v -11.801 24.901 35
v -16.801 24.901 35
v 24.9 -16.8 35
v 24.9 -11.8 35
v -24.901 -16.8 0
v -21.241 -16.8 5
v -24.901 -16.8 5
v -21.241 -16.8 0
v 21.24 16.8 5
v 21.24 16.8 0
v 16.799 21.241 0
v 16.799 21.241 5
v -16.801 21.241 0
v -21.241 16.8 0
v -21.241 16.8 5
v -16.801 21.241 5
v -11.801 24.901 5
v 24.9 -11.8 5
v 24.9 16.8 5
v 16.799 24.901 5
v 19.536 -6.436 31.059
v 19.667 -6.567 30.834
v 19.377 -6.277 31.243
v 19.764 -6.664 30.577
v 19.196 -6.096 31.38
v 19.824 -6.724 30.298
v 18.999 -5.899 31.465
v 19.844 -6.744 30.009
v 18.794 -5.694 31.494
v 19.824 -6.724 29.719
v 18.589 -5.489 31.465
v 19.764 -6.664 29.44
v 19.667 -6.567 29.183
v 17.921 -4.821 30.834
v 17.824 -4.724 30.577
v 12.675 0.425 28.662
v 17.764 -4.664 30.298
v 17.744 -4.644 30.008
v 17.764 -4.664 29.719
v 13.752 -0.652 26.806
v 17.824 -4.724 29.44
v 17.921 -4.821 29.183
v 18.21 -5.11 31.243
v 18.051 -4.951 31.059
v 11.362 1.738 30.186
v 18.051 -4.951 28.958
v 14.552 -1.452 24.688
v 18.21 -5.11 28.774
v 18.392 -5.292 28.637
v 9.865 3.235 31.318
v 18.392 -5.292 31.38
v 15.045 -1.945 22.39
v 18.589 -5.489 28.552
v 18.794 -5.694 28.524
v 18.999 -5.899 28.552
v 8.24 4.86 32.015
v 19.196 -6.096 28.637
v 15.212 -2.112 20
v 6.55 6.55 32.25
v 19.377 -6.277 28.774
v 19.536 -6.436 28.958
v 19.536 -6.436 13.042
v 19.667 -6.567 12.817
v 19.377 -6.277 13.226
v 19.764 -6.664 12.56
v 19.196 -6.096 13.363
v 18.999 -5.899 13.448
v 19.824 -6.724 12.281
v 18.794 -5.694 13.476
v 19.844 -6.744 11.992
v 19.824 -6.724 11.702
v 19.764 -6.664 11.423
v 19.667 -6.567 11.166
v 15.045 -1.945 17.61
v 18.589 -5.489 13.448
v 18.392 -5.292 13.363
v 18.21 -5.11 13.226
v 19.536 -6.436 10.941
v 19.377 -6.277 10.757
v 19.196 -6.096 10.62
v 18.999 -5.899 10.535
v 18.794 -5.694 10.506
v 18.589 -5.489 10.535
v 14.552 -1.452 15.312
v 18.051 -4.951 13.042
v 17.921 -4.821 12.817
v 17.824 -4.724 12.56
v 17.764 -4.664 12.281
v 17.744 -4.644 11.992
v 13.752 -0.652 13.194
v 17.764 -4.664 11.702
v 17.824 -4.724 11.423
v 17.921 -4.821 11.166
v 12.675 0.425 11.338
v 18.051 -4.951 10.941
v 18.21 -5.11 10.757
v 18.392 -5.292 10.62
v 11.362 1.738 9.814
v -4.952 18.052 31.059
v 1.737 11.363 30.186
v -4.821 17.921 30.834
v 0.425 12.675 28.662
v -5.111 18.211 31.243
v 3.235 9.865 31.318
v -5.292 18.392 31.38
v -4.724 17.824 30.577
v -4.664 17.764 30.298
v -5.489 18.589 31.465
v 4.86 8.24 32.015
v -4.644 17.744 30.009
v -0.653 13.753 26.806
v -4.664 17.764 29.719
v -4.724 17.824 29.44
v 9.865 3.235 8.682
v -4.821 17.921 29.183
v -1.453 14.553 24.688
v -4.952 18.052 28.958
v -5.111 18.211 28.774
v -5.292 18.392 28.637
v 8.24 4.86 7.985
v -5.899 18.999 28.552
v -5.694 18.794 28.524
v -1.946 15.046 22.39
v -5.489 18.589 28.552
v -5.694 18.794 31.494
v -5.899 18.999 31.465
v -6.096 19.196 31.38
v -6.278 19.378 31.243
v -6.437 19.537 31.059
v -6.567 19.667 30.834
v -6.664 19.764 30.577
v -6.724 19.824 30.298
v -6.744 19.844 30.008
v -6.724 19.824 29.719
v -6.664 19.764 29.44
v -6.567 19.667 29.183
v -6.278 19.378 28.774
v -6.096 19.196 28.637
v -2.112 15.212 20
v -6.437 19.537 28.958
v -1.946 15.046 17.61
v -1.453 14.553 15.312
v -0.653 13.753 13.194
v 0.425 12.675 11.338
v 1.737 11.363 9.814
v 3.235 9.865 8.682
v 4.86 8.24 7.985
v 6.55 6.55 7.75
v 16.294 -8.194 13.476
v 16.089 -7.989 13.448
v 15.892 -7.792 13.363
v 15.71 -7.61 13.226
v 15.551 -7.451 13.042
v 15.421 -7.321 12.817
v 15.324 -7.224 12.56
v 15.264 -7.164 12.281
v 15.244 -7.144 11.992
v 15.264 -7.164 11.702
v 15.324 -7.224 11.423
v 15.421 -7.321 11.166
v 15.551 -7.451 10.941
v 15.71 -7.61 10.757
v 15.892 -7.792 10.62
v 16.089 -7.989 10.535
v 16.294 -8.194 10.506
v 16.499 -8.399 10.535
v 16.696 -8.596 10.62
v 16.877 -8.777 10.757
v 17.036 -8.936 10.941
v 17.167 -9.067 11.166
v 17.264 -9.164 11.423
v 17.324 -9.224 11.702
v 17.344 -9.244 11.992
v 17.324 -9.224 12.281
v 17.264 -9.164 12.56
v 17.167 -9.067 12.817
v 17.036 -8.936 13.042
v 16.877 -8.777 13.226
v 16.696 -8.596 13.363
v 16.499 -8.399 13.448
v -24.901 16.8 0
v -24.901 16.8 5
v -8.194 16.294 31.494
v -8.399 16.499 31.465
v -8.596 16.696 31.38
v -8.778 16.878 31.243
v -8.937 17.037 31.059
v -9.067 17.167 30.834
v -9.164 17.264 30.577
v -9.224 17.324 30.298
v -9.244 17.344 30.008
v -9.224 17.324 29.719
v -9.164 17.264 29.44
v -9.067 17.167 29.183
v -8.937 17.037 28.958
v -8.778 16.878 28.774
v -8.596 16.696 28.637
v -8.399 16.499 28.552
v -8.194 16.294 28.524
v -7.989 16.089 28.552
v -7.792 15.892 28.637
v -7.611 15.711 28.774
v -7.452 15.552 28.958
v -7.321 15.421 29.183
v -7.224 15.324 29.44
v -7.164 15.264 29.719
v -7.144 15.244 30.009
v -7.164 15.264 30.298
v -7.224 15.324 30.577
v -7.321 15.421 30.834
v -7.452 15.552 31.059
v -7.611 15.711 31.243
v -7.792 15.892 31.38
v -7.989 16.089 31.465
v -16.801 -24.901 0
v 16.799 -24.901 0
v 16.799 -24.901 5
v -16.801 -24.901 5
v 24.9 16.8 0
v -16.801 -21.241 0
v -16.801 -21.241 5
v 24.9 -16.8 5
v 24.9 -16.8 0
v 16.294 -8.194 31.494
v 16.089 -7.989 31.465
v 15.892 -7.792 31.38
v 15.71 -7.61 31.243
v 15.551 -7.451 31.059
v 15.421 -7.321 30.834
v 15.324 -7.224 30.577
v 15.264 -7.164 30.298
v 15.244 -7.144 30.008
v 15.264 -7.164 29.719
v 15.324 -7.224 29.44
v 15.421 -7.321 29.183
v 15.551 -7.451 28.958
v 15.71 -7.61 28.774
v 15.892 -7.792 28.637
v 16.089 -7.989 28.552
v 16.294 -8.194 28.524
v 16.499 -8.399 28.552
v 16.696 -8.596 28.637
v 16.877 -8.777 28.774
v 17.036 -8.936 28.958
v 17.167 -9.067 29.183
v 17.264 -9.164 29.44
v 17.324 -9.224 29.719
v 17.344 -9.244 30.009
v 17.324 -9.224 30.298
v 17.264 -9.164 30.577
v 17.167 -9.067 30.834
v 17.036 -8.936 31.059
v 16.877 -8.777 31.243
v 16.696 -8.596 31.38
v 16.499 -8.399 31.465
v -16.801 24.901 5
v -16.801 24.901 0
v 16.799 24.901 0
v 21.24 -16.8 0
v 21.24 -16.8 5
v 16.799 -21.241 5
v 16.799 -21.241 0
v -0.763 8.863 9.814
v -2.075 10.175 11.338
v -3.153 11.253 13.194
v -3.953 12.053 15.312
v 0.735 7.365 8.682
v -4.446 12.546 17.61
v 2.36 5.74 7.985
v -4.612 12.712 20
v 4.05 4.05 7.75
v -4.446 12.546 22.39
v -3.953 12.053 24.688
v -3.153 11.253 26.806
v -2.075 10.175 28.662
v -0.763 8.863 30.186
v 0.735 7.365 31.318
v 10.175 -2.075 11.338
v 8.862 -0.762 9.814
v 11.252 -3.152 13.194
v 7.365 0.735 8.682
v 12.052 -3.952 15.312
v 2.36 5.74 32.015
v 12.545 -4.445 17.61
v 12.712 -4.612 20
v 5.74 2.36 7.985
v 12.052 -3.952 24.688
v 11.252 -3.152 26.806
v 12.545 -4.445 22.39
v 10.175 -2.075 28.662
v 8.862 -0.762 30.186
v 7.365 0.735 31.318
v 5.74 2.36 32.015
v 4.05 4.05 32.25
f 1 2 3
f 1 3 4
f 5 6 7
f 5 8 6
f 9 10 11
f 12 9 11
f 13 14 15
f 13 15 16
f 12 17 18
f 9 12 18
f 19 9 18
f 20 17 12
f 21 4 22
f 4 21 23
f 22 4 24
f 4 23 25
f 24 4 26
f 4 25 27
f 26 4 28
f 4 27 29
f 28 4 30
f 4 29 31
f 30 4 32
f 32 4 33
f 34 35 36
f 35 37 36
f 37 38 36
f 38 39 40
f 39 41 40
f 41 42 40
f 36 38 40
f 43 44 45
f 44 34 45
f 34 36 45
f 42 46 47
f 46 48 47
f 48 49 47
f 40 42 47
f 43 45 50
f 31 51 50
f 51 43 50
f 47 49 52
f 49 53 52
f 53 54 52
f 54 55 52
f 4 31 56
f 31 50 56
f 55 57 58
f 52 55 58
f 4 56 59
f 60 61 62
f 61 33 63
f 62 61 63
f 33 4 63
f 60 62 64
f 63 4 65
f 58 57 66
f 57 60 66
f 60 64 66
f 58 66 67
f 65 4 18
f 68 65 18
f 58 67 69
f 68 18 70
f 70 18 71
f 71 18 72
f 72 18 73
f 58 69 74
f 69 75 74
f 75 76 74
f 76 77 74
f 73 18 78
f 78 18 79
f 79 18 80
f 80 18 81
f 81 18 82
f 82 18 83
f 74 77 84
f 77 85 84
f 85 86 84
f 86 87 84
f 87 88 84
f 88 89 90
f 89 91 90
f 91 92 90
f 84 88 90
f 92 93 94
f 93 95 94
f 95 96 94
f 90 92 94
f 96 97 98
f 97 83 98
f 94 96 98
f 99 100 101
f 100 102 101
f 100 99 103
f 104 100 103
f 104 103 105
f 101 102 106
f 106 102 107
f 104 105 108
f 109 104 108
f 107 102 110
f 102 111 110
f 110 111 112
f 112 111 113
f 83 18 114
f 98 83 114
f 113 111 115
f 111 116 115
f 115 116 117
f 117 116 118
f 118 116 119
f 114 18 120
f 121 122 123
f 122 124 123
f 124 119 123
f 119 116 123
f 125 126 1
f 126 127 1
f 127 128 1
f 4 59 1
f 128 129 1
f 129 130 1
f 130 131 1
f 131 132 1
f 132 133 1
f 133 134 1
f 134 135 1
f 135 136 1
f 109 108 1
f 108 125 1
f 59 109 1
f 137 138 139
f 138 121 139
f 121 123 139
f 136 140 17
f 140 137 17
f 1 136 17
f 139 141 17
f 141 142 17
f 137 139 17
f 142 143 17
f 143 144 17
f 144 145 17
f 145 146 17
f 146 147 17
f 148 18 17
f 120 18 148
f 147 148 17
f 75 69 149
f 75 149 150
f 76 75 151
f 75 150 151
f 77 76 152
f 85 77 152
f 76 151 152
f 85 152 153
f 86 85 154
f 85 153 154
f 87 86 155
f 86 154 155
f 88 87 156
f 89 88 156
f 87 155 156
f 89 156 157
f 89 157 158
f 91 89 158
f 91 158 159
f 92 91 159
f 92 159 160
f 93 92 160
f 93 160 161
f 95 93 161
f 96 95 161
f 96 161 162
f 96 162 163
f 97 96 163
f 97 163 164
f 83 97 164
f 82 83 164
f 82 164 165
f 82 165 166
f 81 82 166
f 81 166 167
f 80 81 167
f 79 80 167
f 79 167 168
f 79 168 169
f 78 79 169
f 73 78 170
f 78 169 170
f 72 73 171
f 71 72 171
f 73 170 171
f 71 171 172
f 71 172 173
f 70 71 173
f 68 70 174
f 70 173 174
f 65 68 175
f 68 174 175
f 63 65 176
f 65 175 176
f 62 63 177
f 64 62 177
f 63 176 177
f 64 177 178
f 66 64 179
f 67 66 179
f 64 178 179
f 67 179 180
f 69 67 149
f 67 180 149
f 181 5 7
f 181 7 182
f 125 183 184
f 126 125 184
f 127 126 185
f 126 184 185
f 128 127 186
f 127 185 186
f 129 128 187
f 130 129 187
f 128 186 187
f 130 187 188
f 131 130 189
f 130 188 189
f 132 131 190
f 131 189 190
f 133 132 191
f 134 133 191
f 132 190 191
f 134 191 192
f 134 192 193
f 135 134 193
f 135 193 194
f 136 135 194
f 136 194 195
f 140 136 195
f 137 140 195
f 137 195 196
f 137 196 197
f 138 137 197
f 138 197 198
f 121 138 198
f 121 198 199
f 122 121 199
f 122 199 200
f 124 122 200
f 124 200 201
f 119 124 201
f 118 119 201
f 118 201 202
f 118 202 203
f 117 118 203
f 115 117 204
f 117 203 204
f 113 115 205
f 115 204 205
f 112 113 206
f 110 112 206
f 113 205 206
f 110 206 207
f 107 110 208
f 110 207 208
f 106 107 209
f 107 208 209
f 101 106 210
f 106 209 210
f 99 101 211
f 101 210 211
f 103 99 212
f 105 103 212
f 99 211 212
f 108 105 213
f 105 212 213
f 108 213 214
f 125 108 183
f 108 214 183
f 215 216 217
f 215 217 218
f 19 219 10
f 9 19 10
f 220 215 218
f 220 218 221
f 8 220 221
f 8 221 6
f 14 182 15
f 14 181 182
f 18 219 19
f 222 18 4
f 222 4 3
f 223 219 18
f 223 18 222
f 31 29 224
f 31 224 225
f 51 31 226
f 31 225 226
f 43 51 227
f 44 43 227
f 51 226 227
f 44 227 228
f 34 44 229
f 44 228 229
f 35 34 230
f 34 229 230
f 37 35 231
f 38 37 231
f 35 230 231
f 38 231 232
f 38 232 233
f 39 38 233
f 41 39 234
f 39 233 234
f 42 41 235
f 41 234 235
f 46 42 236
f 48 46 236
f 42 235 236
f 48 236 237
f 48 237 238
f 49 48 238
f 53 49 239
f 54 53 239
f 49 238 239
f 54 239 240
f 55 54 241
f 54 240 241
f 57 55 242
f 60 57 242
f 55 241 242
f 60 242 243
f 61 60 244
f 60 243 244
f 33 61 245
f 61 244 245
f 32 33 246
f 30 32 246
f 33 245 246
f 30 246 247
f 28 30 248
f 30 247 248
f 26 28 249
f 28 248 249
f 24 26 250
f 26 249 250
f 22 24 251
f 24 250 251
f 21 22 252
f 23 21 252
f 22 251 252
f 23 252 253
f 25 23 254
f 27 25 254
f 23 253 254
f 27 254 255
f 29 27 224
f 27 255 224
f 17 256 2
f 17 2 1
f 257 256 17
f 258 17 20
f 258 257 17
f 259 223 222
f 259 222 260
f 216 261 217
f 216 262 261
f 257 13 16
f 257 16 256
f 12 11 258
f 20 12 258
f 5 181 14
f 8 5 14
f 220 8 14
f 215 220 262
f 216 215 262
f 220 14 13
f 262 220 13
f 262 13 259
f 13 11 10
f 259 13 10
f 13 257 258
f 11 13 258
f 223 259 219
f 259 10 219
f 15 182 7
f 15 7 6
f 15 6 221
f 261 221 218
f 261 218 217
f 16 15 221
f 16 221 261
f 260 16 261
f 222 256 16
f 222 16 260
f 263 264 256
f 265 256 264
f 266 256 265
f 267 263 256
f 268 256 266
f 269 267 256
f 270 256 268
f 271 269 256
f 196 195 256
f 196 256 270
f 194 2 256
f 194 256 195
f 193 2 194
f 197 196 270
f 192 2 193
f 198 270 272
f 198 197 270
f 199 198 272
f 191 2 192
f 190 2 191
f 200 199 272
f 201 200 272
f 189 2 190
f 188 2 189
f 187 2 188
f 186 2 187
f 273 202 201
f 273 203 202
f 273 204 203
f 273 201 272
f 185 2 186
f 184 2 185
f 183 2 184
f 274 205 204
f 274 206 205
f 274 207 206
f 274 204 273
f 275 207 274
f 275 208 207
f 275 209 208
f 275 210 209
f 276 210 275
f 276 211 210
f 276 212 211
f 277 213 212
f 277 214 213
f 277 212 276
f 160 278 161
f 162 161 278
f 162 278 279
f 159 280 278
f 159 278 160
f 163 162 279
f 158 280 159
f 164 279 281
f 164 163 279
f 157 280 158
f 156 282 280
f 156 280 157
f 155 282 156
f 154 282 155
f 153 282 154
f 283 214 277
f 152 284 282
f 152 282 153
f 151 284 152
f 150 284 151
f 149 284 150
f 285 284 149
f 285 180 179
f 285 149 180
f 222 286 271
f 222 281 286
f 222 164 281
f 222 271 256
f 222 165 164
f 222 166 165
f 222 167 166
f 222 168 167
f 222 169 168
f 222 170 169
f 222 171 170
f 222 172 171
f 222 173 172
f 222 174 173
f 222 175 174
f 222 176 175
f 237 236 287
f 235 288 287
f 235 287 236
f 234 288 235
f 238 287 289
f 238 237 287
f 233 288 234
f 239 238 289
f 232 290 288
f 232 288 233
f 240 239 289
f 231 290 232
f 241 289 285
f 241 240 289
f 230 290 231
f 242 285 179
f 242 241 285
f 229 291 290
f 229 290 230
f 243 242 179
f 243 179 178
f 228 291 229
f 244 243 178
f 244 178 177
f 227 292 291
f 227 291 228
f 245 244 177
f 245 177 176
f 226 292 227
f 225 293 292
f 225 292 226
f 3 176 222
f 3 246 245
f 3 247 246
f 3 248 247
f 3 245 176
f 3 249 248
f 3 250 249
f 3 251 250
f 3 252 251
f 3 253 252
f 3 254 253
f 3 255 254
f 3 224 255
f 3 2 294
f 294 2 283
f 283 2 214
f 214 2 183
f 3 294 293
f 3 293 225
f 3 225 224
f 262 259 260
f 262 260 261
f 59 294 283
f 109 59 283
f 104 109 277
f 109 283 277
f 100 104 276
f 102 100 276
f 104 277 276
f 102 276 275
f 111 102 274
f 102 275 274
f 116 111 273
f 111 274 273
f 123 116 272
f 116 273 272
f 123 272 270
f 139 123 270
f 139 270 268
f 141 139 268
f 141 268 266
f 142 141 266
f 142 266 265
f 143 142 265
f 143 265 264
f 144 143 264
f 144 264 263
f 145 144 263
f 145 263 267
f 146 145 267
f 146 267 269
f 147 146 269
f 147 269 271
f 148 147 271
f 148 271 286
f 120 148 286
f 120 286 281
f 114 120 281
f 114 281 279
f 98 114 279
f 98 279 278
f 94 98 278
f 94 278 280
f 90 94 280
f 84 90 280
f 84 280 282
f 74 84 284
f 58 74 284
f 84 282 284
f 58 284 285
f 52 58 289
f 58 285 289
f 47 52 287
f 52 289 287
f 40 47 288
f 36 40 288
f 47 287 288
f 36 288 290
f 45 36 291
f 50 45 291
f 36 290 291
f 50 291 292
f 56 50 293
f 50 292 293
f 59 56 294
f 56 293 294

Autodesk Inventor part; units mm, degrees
ref_plane "YZ Plane" through (0, 0, 0) normal (1, 0, 0) x (0, 1, 0)
ref_plane "XZ Plane" through (0, 0, 0) normal (0, 1, 0) x (-1, 0, 0)
ref_plane "XY Plane" through (0, 0, 0) normal (0, 0, 1) x (1, 0, 0)
sketch "草图1" plane through (0, 0, 0) normal (0, 0, 1) x (1, 0, 0)
  line L0 (24.9, 0) -> (24.9, 16.8)
  line L1 (24.9, 0) -> (41.7, 0) construction
  line L2 (24.9, 16.8) -> (21.24, 16.8)
  line L3 (21.24, 16.8) -> (16.7994, 21.2406)
  line L4 (16.7994, 21.2406) -> (16.7994, 24.9006)
  line L5 (16.7994, 24.9006) -> (-0.0006, 24.9006)
  line L6 (24.9, 0) -> (24.9, -16.8)
  line L7 (24.9, -16.8) -> (21.24, -16.8)
  line L8 (21.24, -16.8) -> (16.7994, -21.2406)
  line L9 (16.7994, -21.2406) -> (16.7994, -24.9006)
  line L10 (16.7994, -24.9006) -> (-0.0006, -24.9006)
  line L11 (-0.0006, -24.9006) -> (-16.8006, -24.9006)
  line L12 (-16.8006, -24.9006) -> (-16.8006, -21.2406)
  line L13 (-16.8006, -21.2406) -> (-21.2413, -16.8)
  line L14 (-21.2413, -16.8) -> (-24.9013, -16.8)
  line L15 (-24.9013, -16.8) -> (-24.9013, 0)
  line L16 (-24.9013, 0) -> (-24.9013, 16.8)
  line L17 (-24.9013, 16.8) -> (-21.2413, 16.8)
  line L18 (-21.2413, 16.8) -> (-16.8006, 21.2406)
  line L19 (-16.8006, 21.2406) -> (-16.8006, 24.9006)
  line L20 (-16.8006, 24.9006) -> (-0.0006, 24.9006)
  point P0 (0, 0)
extrude "拉伸1" add sketch "草图1" along normal blind 5
sketch "草图2" plane through (0, 0, 5) normal (0, 0, 1) x (1, 0, 0)
  point P0 (0, 0)
sketch "草图3" plane through (0, 0, 5) normal (0, 0, 1) x (1, 0, 0)
  line L0 (21.24, -16.8) -> (-16.8006, 21.2406)
  line L1 (-16.8006, 24.9006) -> (-16.8006, 21.2406) projected
  line L2 (-16.8006, 24.9006) -> (-11.8006, 24.9006)
  line L3 (16.7994, 24.9006) -> (-16.8006, 24.9006) projected
  line L4 (21.24, -16.8) -> (24.9, -16.8) projected
  line L5 (24.9, -16.8) -> (24.9, -11.8)
  line L6 (24.9, -16.8) -> (24.9, 16.8) projected
  line L7 (24.9, -11.8) -> (-11.8006, 24.9006)
  point P0 (0, 0)
extrude "拉伸2" add sketch "草图3" along normal blind 30
sketch "草图4" plane through (-11.8006, 24.9006, 5) normal (0.7071, 0.7071, 0) x (-0.7071, 0.7071, 0)
  line L0 (-51.9025, 0) -> (-51.9025, 30) projected
  line L1 (0, 0) -> (0, 30) projected
  line L2 (-51.9025, 30) -> (0, 0) construction
  line L3 (-51.9025, 30) -> (0, 30) projected
  line L4 (0, 30) -> (-51.9025, 0) construction
  point P0 (-25.9517, -5)
  point P1 (-25.9513, 15)
hole "孔1" at (6.5497, 6.5503, 20) direction (-0.7071, -0.7071, 0) diameter 24.5 end through all
sketch "草图5" plane through (-11.8006, 24.9006, 5) normal (0.7071, 0.7071, 0) x (-0.7071, 0.7071, 0)
  line L0 (-51.9025, 0) -> (-51.9025, 30) projected
  line L1 (0, 0) -> (-51.9025, 0) projected
  line L2 (0, 0) -> (0, 30) projected
  point P0 (-25.9517, -5)
  point P1 (-25.9513, 15)
  point P2 (-12.9646, 7.4936)
hole "孔2" at (6.5497, 6.5503, 20) direction (-0.7071, -0.7071, 0) diameter 0.01 end through all
sketch "草图6" plane through (0, 0, 35) normal (0, 0, 1) x (1, 0, 0)
  line L0 (-11.8006, 24.9006) -> (-16.8006, 24.9006) projected
  line L1 (-16.8006, 24.9006) -> (-16.8006, 21.2406) projected
  line L2 (-16.8006, 24.9006) -> (-16.8006, 21.2406)
  line L3 (21.24, -16.8) -> (-16.8006, 21.2406) projected
  line L4 (-16.8006, 21.2406) -> (21.24, -16.8)
  line L5 (24.9, -16.8) -> (24.9, 16.8) projected
  line L6 (-16.8006, 24.9006) -> (24.9, -16.8)
  line L7 (24.9, -16.8) -> (21.24, -16.8)
  point P0 (0, 0)
extrude "拉伸3" cut sketch "草图6" against normal blind 30
sketch "草图7" plane through (-11.8006, 24.9006, 5) normal (0.7071, 0.7071, 0) x (-0.7071, 0.7071, 0)
  line L0 (-51.9025, 0) -> (-51.9025, 30) projected
  line L1 (0, 0) -> (0, 30) projected
  line L2 (-51.9025, 30) -> (0, 0)
  line L3 (-51.9025, 0) -> (0, 30)
  line L4 (-25.9513, 15) -> (-43.2669, 25.0085)
  line L5 (-25.9513, 15) -> (-7.1239, 25.8823)
  line L6 (-25.9513, 15) -> (-8.6357, 25.0085)
  line L7 (-25.9513, 15) -> (-41.7093, 5.8917)
  line L8 (-25.9513, 15) -> (-43.2669, 4.9915)
  point P0 (-25.9517, -5)
hole "孔3" at (18.7937, -5.6937, 30.0085) at (-5.6943, 18.7943, 30.0085) direction (-0.7071, -0.7071, 0) diameter 2.97 end through all
sketch "草图8" plane through (-11.8006, 24.9006, 5) normal (0.7071, 0.7071, 0) x (-0.7071, 0.7071, 0)
  circle A0 centre (-43.2669, 4.9915) radius 1.485 projected
  line L0 (-43.2669, 4.9915) -> (-43.2669, 6.9915)
  point P0 (-25.9517, -5)
  dimension "d43" = 2
hole "孔4" at (18.7937, -5.6937, 11.9915) direction (-0.7071, -0.7071, 0) diameter 2.97 end through all
equation "\"d41\" = Thickness"
equation "\"d49\" = Thickness"
equation "\"BendRadius\" = Thickness"
equation "\"BendReliefWidth\" = Thickness"
equation "\"BendReliefDepth\" = 0.5 * Thickness"
equation "\"CornerReliefSize\" = 4 * Thickness"
equation "\"MinimumRemnant\" = 2 * Thickness"
equation "\"TransitionRadius\" = BendRadius"
equation "\"JacobiRadiusSize\" = BendRadius"
equation "\"GapSize\" = Thickness"
equation "\"Thickness\" = 0.5"
properties part number "可调底座"
